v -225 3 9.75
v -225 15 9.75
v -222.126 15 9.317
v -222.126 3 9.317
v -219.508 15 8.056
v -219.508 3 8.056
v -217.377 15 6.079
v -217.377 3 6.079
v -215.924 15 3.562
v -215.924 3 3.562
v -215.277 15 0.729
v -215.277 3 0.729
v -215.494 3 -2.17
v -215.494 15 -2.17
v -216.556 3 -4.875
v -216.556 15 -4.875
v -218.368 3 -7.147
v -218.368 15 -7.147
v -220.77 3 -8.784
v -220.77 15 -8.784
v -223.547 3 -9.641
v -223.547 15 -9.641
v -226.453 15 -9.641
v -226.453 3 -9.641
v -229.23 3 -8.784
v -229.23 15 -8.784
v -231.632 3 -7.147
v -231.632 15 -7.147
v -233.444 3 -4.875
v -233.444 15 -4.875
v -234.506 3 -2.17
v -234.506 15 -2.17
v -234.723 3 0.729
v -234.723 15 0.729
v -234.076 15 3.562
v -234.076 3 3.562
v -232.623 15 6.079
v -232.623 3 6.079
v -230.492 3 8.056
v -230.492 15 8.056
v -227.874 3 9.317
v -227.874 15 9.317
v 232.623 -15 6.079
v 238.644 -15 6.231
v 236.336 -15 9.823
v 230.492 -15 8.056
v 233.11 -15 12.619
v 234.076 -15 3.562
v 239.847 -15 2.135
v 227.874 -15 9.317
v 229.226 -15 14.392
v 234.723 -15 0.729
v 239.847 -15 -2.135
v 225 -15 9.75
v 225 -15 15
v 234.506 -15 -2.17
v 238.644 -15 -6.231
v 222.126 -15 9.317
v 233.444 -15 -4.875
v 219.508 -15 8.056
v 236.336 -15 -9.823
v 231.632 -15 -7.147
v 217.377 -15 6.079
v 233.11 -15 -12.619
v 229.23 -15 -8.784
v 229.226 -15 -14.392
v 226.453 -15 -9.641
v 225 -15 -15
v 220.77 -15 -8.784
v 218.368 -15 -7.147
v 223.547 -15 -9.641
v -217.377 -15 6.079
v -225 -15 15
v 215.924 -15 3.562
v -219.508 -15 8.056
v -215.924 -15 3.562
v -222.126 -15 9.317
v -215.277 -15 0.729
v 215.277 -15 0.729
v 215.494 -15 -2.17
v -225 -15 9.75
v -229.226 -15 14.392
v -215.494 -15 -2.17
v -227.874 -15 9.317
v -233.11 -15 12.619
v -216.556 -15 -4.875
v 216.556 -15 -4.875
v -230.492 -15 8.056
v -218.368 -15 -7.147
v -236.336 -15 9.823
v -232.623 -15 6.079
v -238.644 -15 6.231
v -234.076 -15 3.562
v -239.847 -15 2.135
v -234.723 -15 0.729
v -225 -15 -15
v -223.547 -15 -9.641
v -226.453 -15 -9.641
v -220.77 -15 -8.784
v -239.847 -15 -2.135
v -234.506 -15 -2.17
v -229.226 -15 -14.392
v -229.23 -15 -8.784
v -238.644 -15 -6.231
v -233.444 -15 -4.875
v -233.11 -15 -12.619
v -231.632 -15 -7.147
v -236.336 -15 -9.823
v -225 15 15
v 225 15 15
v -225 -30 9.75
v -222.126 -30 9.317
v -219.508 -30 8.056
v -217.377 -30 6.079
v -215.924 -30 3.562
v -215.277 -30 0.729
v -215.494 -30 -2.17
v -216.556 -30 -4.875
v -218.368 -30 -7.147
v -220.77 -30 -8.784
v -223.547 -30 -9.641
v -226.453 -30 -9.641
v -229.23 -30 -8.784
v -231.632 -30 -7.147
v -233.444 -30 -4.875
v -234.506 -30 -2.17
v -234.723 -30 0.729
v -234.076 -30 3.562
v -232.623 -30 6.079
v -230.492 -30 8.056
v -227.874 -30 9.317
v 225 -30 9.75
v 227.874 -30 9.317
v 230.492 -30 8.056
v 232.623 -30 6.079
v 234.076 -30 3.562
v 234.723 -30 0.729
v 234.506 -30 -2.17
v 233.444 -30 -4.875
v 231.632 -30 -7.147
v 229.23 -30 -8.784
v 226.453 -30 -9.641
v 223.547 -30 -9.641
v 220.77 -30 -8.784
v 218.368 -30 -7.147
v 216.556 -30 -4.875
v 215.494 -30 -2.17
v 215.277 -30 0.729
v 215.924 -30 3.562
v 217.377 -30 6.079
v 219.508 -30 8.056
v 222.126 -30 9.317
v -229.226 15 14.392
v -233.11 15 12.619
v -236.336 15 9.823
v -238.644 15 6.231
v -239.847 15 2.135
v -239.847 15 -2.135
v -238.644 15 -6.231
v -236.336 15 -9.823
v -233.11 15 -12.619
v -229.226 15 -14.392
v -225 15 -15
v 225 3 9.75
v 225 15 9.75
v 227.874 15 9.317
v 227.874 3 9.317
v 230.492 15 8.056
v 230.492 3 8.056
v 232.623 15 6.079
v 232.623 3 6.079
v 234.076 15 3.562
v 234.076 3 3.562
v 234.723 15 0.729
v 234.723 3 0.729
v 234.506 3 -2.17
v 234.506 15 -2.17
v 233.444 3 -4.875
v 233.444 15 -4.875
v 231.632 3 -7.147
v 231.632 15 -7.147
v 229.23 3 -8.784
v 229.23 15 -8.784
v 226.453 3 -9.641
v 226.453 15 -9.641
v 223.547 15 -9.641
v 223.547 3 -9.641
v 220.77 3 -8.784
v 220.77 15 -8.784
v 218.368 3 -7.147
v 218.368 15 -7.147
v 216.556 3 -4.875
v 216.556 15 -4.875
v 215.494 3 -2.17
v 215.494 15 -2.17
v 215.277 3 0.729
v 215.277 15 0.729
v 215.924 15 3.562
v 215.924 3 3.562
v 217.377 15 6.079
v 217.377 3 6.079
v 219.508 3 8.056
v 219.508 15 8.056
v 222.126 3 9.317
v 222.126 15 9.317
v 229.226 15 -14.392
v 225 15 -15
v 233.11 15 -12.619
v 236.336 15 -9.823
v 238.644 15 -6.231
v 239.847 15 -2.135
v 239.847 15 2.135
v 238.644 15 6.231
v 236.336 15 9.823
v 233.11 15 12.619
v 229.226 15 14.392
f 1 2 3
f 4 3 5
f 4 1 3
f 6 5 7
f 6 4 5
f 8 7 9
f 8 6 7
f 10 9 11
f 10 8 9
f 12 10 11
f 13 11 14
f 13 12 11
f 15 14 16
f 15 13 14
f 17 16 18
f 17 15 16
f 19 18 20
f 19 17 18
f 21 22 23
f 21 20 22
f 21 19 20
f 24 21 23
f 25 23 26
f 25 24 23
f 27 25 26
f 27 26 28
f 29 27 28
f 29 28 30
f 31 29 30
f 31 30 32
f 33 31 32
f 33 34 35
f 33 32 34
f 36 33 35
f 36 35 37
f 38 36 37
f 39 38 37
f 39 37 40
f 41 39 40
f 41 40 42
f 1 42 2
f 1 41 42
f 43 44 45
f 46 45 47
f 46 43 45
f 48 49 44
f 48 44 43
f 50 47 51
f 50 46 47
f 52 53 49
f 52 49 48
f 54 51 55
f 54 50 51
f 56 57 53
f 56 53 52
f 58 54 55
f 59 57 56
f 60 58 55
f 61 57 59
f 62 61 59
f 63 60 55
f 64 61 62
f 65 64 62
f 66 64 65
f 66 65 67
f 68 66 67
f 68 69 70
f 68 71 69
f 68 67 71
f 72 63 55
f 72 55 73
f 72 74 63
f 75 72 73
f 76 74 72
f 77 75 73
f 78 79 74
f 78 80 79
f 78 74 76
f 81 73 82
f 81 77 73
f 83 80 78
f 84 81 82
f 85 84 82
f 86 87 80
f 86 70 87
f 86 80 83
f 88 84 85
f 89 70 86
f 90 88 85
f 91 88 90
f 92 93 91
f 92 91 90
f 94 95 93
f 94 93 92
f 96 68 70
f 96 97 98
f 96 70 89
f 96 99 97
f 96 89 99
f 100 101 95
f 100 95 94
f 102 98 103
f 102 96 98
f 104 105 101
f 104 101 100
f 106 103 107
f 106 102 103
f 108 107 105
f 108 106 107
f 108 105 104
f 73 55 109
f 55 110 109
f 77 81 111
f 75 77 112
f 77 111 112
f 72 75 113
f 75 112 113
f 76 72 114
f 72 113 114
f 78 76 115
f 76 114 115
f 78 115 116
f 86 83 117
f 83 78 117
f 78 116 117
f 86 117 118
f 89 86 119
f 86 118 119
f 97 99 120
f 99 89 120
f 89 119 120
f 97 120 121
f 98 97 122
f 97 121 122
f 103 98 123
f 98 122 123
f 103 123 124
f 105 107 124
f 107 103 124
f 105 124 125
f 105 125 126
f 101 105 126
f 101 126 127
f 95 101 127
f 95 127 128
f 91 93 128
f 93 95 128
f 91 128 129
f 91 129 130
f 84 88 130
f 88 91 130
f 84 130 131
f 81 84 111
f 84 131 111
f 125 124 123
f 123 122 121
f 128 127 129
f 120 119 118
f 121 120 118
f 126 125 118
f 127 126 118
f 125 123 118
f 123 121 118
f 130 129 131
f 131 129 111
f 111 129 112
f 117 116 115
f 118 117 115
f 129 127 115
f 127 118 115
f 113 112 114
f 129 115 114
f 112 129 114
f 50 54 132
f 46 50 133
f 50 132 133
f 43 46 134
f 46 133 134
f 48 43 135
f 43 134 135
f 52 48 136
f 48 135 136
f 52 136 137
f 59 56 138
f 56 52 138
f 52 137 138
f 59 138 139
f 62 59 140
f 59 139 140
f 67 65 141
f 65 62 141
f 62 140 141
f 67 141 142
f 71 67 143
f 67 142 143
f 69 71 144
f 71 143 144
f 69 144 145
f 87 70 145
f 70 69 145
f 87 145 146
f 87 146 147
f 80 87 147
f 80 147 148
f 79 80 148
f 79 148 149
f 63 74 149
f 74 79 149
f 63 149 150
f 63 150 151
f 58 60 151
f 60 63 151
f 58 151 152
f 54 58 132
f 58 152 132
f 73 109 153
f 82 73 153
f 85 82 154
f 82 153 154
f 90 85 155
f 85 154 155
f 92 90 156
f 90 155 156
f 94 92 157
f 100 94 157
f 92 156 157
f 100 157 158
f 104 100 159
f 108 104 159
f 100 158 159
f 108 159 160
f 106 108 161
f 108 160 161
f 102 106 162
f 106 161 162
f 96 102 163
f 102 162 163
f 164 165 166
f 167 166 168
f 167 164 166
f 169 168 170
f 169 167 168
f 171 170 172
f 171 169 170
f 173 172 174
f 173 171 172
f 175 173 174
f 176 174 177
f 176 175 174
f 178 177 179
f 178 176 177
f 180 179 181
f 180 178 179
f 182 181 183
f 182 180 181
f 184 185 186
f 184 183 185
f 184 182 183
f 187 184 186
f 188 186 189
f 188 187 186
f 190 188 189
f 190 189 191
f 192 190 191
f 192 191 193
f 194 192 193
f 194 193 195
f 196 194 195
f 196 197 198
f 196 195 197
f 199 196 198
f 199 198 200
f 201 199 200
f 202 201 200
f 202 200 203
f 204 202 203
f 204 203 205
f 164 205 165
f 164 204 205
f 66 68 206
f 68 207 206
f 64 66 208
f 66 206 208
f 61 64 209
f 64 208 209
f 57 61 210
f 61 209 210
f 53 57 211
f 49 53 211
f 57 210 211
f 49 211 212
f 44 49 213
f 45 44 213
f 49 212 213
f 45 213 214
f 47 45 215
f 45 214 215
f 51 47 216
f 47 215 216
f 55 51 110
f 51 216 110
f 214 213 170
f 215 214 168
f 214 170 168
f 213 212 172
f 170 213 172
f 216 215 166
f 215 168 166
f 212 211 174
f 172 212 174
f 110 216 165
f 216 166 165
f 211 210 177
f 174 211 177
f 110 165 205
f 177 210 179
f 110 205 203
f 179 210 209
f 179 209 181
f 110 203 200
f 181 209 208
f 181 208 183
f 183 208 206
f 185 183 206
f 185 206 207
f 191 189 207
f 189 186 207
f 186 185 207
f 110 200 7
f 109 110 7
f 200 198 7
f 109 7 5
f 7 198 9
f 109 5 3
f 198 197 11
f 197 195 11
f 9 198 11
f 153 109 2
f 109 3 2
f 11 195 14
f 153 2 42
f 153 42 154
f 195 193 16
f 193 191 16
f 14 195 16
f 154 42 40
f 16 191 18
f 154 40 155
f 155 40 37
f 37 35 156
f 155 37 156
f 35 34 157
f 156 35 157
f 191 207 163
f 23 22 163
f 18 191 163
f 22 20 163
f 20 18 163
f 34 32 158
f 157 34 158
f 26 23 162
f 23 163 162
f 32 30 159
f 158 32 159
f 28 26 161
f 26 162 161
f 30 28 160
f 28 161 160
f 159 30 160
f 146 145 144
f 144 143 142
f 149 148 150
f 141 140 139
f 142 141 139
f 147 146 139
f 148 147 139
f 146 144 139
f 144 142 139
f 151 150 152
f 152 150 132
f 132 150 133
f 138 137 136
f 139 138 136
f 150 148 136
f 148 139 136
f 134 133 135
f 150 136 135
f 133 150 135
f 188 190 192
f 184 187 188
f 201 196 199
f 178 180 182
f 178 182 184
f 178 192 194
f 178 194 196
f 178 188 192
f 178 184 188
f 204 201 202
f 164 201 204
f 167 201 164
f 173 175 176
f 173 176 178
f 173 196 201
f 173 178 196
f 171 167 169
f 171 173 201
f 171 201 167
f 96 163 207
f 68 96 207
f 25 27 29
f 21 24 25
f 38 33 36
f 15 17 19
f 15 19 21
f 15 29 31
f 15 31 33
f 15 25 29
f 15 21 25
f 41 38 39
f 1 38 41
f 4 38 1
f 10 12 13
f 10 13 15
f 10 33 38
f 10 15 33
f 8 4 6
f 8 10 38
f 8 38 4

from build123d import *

# Parameters (mm, degrees)
BOSS_EXTRUDE1_DEPTH = 15
SKETCH2_R           = 9.75
CUT_EXTRUDE2_DEPTH  = 241.935676063
BOSS_EXTRUDE2_START = -30
SKETCH2_3_R         = 9.75
BOSS_EXTRUDE2_DEPTH = 30
SKETCH2_4_R         = 9.75
BOSS_EXTRUDE3_DEPTH = 3


with BuildPart() as part:
    # Sketch1 → Boss-Extrude1 (new, symmetric)
    with BuildSketch(Plane(origin=(0, 0, 0), x_dir=(1, 0, 0), z_dir=(0, 1, 0))):
        with BuildLine():
            Line((-225, 15), (225, 15))
            ThreePointArc((225, 15), (240, 0), (225, -15))
            Line((225, -15), (-225, -15))
            ThreePointArc((-225, -15), (-240, 0), (-225, 15))
        make_face()
    extrude(amount=BOSS_EXTRUDE1_DEPTH, both=True)

    # Sketch2 → Cut-Extrude2 (cut, through all)
    with BuildSketch(Plane(origin=(0, 0, 0), x_dir=(1, 0, 0), z_dir=(0, 1, 0))):
        with Locations((-225, 0)):
            Circle(SKETCH2_R)
        with Locations((225, 0)):
            Circle(SKETCH2_R)
    extrude(amount=CUT_EXTRUDE2_DEPTH, mode=Mode.SUBTRACT)

    # Sketch2<3> → Boss-Extrude2 (add)
    with BuildSketch(Plane(origin=(0, 0, 0), x_dir=(1, 0, 0), z_dir=(0, 1, 0)).offset(BOSS_EXTRUDE2_START)):
        with Locations((-225, 0)):
            Circle(SKETCH2_3_R)
        with Locations((225, 0)):
            Circle(SKETCH2_3_R)
    extrude(amount=BOSS_EXTRUDE2_DEPTH)

    # Sketch2<4> → Boss-Extrude3 (add)
    with BuildSketch(Plane(origin=(0, 0, 0), x_dir=(1, 0, 0), z_dir=(0, 1, 0))):
        with Locations((-225, 0)):
            Circle(SKETCH2_4_R)
        with Locations((225, 0)):
            Circle(SKETCH2_4_R)
    extrude(amount=BOSS_EXTRUDE3_DEPTH)


solid = part.part
